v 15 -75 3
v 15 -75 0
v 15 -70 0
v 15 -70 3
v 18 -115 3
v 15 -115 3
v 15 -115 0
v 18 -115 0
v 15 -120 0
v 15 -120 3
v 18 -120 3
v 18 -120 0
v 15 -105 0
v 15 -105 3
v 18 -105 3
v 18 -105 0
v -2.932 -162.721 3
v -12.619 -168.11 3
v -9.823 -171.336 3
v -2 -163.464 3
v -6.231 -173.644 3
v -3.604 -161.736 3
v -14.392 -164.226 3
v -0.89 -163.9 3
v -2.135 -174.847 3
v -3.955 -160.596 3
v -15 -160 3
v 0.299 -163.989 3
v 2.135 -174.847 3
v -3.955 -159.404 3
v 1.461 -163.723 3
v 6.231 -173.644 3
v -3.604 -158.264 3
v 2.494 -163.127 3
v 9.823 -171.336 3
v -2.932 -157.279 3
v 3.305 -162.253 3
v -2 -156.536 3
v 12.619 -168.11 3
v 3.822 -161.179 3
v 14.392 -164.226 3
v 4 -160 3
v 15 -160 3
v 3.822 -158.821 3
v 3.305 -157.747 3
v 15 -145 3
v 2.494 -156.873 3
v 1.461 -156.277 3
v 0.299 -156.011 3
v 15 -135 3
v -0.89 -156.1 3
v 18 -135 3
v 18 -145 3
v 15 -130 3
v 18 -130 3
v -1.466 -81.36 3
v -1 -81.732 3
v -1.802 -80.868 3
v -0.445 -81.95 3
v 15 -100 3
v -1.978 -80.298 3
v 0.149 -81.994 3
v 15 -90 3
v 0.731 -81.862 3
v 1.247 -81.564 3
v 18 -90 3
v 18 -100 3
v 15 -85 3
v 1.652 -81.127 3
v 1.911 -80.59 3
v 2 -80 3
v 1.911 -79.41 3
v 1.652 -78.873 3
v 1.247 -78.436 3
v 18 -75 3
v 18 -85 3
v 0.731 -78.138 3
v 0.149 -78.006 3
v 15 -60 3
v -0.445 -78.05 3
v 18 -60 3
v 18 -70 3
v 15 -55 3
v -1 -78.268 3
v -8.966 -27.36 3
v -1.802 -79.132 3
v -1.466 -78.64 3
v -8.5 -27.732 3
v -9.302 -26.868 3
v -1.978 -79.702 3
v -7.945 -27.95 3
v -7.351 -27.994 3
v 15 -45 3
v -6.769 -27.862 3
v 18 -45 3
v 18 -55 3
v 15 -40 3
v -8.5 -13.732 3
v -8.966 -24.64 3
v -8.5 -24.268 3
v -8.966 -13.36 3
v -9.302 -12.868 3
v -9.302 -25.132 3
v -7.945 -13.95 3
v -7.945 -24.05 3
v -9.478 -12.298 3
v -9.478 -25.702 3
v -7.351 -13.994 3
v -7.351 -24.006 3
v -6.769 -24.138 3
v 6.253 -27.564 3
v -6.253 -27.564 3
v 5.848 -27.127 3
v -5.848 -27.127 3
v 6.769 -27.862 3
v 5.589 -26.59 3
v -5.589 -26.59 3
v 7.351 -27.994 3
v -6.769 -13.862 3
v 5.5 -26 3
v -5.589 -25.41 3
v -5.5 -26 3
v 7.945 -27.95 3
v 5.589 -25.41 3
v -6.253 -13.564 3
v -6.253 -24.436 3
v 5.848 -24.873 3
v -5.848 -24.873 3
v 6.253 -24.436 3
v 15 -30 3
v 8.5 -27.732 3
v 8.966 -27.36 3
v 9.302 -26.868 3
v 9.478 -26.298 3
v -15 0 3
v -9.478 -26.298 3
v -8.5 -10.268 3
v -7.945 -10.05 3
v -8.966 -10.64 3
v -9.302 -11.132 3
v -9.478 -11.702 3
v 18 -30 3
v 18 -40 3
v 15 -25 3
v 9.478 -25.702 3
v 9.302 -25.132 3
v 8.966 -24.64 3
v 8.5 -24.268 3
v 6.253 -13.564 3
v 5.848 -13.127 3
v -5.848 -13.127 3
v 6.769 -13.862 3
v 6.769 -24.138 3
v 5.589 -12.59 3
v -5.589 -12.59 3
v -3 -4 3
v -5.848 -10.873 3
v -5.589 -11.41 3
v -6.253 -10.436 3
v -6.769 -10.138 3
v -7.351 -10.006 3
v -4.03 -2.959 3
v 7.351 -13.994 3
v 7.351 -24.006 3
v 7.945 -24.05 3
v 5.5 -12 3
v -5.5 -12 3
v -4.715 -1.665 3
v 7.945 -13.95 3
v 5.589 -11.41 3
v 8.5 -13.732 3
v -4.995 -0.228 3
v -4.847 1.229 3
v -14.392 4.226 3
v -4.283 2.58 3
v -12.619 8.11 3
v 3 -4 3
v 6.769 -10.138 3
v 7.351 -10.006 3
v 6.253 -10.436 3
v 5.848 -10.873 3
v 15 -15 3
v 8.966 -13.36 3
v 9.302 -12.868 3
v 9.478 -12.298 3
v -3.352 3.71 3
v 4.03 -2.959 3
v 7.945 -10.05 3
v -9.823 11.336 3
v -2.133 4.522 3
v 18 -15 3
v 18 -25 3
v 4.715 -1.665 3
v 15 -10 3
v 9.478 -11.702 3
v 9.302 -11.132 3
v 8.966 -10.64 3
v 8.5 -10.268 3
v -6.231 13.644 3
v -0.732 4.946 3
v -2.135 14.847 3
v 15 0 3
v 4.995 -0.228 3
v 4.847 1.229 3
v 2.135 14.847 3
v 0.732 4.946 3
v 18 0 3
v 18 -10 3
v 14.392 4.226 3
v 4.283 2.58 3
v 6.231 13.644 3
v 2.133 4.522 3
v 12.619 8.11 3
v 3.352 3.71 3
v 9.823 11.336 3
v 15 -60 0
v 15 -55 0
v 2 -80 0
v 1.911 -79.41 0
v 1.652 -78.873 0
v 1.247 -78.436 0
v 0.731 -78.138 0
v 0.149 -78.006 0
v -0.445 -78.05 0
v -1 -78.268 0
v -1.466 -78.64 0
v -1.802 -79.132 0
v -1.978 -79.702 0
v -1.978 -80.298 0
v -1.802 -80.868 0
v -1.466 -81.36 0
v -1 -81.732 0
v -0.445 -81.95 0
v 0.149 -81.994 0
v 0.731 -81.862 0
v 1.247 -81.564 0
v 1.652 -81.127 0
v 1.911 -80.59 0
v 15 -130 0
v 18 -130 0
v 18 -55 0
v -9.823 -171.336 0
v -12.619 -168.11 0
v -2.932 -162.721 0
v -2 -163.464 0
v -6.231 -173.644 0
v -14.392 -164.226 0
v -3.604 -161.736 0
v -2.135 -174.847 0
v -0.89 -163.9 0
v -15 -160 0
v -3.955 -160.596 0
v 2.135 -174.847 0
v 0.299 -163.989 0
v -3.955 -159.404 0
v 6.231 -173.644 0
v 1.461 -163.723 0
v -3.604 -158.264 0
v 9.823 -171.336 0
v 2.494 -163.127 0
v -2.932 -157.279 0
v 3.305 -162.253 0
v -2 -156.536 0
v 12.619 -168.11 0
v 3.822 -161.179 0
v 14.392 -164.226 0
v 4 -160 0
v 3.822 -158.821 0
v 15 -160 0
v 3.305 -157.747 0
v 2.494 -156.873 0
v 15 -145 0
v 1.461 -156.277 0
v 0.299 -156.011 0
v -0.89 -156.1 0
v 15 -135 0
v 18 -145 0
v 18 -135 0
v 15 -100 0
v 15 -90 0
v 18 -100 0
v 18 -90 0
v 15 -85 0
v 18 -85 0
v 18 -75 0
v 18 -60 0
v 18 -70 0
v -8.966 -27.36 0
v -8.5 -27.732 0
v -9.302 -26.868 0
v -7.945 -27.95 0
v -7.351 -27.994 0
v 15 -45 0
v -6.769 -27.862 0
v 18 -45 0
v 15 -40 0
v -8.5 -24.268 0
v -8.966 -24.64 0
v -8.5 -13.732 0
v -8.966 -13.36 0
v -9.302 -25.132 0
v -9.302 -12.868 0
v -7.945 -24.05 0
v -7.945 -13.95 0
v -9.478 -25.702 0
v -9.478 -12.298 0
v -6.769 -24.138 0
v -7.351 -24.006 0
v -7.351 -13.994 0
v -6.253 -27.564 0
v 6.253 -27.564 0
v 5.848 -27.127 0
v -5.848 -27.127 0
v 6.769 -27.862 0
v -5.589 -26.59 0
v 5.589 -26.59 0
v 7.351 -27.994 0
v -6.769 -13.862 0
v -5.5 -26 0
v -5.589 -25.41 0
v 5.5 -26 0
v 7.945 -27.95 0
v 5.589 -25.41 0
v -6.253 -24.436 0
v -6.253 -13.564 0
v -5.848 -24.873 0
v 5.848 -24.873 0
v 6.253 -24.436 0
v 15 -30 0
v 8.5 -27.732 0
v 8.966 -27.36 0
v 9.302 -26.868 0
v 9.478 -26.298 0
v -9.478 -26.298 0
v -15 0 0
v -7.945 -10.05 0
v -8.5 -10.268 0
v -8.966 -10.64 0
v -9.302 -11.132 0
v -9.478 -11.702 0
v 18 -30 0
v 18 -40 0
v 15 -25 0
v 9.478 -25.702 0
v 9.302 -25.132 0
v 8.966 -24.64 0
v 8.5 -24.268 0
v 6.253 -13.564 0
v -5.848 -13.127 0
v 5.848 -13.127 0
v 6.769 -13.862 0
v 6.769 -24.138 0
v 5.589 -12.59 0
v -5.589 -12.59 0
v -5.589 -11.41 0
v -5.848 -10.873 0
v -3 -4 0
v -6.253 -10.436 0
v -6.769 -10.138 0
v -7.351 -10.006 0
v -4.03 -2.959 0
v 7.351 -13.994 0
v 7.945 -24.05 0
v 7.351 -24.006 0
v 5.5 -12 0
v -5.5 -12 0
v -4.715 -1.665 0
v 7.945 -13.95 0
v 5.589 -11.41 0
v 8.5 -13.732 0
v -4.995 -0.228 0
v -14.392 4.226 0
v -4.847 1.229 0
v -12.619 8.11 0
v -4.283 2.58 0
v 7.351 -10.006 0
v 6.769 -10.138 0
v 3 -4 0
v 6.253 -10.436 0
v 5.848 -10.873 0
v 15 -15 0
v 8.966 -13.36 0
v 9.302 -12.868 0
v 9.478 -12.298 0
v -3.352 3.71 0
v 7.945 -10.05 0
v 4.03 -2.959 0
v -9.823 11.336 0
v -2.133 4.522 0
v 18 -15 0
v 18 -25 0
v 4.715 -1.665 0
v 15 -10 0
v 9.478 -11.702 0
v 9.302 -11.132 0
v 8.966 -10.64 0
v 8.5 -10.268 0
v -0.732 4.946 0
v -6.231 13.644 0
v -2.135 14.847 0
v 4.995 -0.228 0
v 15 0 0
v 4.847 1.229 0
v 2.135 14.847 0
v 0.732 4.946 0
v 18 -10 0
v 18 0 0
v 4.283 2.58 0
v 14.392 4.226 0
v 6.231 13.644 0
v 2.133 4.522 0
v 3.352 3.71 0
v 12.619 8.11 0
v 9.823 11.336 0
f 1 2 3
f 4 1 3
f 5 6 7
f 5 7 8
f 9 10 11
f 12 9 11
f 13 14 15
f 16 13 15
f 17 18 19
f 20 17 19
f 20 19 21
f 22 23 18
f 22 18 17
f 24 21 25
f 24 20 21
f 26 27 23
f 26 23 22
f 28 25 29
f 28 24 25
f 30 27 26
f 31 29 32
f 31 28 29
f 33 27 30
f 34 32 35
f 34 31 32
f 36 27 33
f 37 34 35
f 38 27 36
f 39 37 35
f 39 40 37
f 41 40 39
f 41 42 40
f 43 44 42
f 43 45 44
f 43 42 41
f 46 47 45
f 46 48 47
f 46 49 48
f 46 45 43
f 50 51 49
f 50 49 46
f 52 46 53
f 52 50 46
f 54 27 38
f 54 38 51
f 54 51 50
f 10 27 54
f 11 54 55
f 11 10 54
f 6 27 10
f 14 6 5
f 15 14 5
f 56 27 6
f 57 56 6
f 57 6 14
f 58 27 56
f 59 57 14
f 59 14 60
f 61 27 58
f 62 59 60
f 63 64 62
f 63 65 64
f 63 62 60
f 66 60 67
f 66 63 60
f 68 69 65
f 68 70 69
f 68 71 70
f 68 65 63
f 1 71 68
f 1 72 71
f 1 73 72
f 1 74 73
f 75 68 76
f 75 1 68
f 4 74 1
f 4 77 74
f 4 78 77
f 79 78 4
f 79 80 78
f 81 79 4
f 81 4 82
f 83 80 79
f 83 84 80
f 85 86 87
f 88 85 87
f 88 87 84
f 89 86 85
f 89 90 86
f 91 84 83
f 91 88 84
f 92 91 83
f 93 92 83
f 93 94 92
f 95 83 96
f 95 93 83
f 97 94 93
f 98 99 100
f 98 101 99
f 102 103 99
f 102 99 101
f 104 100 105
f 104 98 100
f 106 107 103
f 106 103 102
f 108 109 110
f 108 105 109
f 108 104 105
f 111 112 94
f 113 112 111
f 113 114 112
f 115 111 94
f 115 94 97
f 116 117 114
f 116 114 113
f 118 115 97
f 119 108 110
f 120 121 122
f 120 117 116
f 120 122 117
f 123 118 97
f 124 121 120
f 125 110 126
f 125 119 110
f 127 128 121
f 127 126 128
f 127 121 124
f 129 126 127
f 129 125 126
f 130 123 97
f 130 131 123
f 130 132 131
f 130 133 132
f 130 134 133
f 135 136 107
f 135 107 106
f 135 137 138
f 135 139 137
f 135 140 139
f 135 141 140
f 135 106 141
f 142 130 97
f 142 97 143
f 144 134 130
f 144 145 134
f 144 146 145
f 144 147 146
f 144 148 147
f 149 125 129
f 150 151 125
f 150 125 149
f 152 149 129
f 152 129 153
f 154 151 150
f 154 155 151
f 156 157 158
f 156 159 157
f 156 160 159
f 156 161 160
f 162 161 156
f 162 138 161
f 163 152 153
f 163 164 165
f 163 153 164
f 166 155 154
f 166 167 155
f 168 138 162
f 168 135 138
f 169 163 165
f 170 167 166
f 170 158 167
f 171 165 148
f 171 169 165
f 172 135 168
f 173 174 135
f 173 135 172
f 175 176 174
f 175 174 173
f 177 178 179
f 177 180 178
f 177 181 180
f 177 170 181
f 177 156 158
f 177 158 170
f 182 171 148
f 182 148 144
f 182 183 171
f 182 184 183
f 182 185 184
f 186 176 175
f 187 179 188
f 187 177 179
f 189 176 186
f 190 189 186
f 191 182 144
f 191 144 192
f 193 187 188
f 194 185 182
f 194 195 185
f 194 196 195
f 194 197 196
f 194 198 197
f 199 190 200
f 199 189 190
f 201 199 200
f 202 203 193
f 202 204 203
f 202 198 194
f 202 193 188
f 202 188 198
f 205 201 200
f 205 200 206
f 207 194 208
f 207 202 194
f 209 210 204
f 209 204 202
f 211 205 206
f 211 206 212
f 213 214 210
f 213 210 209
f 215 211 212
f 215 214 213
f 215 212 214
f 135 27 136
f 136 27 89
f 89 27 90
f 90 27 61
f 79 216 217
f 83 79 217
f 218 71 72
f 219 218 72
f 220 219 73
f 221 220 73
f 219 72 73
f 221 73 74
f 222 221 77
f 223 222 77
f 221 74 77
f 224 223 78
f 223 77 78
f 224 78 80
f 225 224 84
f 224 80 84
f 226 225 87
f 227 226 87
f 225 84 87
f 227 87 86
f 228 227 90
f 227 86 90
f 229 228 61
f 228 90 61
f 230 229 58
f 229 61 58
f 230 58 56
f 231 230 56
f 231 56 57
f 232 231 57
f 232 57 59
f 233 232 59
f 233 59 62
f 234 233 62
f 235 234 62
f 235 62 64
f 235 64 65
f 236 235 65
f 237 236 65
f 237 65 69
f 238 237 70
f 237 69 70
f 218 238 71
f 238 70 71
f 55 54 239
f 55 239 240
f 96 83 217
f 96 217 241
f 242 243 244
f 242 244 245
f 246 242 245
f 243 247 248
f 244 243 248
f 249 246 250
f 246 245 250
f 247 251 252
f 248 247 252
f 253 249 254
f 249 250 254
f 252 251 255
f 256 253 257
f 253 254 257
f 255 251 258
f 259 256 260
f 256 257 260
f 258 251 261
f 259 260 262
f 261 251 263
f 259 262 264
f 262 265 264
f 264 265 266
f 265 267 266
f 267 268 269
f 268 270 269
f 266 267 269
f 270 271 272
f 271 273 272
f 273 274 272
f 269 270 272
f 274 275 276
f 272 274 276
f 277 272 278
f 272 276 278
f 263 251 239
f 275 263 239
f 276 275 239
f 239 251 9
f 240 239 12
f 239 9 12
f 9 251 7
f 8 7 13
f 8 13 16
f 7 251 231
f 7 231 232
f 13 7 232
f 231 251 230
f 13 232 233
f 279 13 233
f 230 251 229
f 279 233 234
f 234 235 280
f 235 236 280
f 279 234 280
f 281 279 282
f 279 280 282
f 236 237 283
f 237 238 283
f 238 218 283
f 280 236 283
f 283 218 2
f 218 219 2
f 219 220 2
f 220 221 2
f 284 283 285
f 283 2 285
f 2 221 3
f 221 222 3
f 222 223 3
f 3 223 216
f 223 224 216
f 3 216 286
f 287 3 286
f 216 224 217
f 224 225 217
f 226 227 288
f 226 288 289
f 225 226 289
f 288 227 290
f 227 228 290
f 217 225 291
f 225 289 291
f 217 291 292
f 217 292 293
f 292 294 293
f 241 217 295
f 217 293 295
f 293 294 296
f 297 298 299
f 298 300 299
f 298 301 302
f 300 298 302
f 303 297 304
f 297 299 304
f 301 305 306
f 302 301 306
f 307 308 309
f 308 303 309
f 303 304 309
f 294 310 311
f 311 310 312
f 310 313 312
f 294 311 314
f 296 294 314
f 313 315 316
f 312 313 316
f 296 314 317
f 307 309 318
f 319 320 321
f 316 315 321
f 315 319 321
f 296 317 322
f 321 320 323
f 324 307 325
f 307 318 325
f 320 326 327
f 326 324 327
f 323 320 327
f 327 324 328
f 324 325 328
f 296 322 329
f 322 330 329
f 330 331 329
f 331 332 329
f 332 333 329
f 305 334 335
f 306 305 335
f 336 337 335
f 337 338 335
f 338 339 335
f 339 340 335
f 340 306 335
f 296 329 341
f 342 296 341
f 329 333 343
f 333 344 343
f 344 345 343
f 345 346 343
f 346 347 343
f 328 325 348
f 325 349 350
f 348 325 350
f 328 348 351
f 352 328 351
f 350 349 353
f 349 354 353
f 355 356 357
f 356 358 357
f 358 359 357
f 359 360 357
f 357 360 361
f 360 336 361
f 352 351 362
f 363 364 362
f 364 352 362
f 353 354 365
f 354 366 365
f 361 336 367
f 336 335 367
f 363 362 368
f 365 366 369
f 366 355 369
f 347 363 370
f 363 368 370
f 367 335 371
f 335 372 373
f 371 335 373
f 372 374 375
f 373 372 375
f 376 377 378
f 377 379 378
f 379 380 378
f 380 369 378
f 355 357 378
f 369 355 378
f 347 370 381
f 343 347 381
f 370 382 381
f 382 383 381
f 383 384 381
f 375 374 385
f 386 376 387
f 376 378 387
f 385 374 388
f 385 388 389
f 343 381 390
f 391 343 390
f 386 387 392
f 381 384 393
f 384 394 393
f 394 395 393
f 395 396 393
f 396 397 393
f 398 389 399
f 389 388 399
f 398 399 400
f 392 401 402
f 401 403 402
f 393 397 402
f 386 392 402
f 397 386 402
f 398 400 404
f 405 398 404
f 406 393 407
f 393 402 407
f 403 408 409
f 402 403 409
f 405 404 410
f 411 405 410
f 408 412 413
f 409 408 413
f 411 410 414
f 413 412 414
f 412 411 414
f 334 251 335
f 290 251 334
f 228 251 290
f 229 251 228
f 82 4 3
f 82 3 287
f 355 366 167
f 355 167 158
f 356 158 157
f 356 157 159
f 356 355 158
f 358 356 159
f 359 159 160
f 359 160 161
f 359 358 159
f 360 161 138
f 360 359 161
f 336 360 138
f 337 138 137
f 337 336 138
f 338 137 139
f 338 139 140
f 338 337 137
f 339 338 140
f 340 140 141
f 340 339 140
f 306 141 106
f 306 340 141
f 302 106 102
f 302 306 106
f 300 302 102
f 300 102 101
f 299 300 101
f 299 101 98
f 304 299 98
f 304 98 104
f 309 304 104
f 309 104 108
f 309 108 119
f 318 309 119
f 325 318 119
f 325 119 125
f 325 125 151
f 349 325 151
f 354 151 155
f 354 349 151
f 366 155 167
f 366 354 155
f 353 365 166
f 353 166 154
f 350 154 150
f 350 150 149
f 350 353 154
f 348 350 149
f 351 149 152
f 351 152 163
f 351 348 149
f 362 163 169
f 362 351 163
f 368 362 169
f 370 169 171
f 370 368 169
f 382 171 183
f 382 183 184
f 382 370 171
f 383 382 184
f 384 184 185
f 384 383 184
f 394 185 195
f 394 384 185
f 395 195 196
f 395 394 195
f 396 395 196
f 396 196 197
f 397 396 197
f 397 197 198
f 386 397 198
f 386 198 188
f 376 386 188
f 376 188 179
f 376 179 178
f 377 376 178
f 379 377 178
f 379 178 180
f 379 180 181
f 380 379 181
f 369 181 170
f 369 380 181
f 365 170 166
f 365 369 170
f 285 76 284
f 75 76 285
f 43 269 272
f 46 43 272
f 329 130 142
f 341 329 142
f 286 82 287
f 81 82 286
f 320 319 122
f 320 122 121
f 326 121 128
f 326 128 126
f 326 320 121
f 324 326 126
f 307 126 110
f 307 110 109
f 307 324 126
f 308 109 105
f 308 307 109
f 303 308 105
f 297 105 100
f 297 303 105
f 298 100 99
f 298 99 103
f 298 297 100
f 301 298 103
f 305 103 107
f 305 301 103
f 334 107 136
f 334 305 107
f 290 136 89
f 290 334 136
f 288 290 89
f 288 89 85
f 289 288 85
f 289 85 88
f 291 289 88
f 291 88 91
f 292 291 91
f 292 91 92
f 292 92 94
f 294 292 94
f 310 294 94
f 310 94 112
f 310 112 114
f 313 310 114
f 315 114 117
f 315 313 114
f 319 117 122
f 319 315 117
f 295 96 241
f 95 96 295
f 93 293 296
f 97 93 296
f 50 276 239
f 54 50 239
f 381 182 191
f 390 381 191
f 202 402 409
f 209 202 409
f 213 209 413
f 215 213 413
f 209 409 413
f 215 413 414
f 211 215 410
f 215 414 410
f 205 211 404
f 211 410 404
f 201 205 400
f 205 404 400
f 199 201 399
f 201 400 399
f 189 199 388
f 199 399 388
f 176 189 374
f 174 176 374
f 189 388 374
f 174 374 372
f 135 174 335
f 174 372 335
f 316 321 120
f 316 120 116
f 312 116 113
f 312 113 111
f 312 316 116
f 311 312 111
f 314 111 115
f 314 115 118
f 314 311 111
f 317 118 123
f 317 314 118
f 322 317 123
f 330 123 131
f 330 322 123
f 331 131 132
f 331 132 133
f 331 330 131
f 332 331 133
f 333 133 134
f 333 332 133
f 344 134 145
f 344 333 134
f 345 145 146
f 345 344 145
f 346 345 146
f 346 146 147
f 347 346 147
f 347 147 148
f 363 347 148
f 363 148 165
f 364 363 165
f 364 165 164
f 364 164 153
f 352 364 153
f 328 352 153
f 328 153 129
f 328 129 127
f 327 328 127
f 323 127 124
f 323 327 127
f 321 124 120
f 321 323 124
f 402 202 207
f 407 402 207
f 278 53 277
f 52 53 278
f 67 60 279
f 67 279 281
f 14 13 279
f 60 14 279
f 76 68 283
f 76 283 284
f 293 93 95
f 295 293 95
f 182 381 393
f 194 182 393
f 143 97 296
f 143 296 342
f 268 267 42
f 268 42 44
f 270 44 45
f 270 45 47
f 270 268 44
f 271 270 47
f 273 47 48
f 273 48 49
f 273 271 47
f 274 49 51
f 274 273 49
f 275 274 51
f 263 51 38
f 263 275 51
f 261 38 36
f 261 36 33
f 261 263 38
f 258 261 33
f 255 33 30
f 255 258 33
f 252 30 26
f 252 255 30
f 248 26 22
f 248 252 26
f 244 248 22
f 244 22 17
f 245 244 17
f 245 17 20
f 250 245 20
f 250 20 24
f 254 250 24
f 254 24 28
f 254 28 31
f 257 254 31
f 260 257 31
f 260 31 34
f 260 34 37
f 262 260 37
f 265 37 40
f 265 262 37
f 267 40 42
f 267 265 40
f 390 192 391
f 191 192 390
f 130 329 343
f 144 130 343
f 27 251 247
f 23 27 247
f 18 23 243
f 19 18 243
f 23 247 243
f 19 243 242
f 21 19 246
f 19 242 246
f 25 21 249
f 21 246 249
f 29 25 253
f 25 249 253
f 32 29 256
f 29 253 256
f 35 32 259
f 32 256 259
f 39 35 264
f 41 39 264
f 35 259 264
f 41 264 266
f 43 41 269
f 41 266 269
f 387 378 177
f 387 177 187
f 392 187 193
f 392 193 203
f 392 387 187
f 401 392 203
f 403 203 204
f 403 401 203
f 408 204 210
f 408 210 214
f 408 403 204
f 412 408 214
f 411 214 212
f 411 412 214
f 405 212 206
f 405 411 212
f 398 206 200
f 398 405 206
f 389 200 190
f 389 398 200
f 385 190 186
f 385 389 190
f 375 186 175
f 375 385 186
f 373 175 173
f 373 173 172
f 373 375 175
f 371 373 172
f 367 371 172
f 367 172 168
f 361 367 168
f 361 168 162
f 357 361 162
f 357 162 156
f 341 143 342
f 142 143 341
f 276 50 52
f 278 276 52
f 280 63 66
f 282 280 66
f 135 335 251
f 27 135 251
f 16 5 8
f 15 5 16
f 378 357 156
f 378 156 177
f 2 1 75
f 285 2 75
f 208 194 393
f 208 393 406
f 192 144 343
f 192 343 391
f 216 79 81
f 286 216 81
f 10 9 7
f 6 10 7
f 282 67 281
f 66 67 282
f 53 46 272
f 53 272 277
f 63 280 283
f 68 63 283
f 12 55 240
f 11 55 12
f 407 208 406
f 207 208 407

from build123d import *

# Parameters (mm, degrees)
SKETCH_1_R          = 4
SKETCH_1_R_2        = 2
EXTRUDE_1_DEPTH     = 3
SKETCH_3_W          = 3
SKETCH_3_H          = 10
EXTRUDE_4_DEPTH     = 3
SKETCH_4_R          = 2
CUT_EXTRUDE_1_DEPTH = 3


with BuildPart() as part:
    # 草图1 → 凸台-拉伸1 (new body)
    with BuildSketch(Plane.XY):
        with BuildLine():
            Line((-15, 0), (-15, -160))
            ThreePointArc((-15, -160), (0, -175), (15, -160))
            Line((15, -160), (15, 0))
            ThreePointArc((15, 0), (0, 15), (-15, 0))
        make_face()
        with Locations((0, -160)):
            Circle(SKETCH_1_R, mode=Mode.SUBTRACT)
        with Locations((-7.5, -12)):
            Circle(SKETCH_1_R_2, mode=Mode.SUBTRACT)
        with Locations((-7.5, -26)):
            Circle(SKETCH_1_R_2, mode=Mode.SUBTRACT)
        with Locations(Location((7.5, -26, 0), (0, 0, 180))):
            Circle(SKETCH_1_R_2, mode=Mode.SUBTRACT)
        with Locations(Location((7.5, -12, 0), (0, 0, 180))):
            Circle(SKETCH_1_R_2, mode=Mode.SUBTRACT)
        with BuildLine():
            Line((0, -4), (3, -4))
            ThreePointArc((3, -4), (0, 5), (-3, -4))
            Line((-3, -4), (0, -4))
        make_face(mode=Mode.SUBTRACT)
    extrude(amount=EXTRUDE_1_DEPTH)

    # 草图3 → 凸台-拉伸4 (add)
    with BuildSketch(Plane.XY.offset(3)):
        with Locations((16.5, -5)):
            Rectangle(SKETCH_3_W, SKETCH_3_H)
        with Locations((16.5, -20)):
            Rectangle(SKETCH_3_W, SKETCH_3_H)
        with Locations((16.5, -35)):
            Rectangle(SKETCH_3_W, SKETCH_3_H)
        with Locations((16.5, -50)):
            Rectangle(SKETCH_3_W, SKETCH_3_H)
        with Locations((16.5, -65)):
            Rectangle(SKETCH_3_W, SKETCH_3_H)
        with Locations((16.5, -80)):
            Rectangle(SKETCH_3_W, SKETCH_3_H)
        with Locations((16.5, -95)):
            Rectangle(SKETCH_3_W, SKETCH_3_H)
        with Locations((16.5, -110)):
            Rectangle(SKETCH_3_W, SKETCH_3_H)
        with Locations((16.5, -125)):
            Rectangle(SKETCH_3_W, SKETCH_3_H)
        with Locations((16.5, -140)):
            Rectangle(SKETCH_3_W, SKETCH_3_H)
    extrude(amount=-EXTRUDE_4_DEPTH)

    # 草图4 → 切除-拉伸1 (cut)
    with BuildSketch(Plane.XY.offset(3)):
        with Locations((0, -80)):
            Circle(SKETCH_4_R)
    extrude(amount=-CUT_EXTRUDE_1_DEPTH, mode=Mode.SUBTRACT)


solid = part.part
